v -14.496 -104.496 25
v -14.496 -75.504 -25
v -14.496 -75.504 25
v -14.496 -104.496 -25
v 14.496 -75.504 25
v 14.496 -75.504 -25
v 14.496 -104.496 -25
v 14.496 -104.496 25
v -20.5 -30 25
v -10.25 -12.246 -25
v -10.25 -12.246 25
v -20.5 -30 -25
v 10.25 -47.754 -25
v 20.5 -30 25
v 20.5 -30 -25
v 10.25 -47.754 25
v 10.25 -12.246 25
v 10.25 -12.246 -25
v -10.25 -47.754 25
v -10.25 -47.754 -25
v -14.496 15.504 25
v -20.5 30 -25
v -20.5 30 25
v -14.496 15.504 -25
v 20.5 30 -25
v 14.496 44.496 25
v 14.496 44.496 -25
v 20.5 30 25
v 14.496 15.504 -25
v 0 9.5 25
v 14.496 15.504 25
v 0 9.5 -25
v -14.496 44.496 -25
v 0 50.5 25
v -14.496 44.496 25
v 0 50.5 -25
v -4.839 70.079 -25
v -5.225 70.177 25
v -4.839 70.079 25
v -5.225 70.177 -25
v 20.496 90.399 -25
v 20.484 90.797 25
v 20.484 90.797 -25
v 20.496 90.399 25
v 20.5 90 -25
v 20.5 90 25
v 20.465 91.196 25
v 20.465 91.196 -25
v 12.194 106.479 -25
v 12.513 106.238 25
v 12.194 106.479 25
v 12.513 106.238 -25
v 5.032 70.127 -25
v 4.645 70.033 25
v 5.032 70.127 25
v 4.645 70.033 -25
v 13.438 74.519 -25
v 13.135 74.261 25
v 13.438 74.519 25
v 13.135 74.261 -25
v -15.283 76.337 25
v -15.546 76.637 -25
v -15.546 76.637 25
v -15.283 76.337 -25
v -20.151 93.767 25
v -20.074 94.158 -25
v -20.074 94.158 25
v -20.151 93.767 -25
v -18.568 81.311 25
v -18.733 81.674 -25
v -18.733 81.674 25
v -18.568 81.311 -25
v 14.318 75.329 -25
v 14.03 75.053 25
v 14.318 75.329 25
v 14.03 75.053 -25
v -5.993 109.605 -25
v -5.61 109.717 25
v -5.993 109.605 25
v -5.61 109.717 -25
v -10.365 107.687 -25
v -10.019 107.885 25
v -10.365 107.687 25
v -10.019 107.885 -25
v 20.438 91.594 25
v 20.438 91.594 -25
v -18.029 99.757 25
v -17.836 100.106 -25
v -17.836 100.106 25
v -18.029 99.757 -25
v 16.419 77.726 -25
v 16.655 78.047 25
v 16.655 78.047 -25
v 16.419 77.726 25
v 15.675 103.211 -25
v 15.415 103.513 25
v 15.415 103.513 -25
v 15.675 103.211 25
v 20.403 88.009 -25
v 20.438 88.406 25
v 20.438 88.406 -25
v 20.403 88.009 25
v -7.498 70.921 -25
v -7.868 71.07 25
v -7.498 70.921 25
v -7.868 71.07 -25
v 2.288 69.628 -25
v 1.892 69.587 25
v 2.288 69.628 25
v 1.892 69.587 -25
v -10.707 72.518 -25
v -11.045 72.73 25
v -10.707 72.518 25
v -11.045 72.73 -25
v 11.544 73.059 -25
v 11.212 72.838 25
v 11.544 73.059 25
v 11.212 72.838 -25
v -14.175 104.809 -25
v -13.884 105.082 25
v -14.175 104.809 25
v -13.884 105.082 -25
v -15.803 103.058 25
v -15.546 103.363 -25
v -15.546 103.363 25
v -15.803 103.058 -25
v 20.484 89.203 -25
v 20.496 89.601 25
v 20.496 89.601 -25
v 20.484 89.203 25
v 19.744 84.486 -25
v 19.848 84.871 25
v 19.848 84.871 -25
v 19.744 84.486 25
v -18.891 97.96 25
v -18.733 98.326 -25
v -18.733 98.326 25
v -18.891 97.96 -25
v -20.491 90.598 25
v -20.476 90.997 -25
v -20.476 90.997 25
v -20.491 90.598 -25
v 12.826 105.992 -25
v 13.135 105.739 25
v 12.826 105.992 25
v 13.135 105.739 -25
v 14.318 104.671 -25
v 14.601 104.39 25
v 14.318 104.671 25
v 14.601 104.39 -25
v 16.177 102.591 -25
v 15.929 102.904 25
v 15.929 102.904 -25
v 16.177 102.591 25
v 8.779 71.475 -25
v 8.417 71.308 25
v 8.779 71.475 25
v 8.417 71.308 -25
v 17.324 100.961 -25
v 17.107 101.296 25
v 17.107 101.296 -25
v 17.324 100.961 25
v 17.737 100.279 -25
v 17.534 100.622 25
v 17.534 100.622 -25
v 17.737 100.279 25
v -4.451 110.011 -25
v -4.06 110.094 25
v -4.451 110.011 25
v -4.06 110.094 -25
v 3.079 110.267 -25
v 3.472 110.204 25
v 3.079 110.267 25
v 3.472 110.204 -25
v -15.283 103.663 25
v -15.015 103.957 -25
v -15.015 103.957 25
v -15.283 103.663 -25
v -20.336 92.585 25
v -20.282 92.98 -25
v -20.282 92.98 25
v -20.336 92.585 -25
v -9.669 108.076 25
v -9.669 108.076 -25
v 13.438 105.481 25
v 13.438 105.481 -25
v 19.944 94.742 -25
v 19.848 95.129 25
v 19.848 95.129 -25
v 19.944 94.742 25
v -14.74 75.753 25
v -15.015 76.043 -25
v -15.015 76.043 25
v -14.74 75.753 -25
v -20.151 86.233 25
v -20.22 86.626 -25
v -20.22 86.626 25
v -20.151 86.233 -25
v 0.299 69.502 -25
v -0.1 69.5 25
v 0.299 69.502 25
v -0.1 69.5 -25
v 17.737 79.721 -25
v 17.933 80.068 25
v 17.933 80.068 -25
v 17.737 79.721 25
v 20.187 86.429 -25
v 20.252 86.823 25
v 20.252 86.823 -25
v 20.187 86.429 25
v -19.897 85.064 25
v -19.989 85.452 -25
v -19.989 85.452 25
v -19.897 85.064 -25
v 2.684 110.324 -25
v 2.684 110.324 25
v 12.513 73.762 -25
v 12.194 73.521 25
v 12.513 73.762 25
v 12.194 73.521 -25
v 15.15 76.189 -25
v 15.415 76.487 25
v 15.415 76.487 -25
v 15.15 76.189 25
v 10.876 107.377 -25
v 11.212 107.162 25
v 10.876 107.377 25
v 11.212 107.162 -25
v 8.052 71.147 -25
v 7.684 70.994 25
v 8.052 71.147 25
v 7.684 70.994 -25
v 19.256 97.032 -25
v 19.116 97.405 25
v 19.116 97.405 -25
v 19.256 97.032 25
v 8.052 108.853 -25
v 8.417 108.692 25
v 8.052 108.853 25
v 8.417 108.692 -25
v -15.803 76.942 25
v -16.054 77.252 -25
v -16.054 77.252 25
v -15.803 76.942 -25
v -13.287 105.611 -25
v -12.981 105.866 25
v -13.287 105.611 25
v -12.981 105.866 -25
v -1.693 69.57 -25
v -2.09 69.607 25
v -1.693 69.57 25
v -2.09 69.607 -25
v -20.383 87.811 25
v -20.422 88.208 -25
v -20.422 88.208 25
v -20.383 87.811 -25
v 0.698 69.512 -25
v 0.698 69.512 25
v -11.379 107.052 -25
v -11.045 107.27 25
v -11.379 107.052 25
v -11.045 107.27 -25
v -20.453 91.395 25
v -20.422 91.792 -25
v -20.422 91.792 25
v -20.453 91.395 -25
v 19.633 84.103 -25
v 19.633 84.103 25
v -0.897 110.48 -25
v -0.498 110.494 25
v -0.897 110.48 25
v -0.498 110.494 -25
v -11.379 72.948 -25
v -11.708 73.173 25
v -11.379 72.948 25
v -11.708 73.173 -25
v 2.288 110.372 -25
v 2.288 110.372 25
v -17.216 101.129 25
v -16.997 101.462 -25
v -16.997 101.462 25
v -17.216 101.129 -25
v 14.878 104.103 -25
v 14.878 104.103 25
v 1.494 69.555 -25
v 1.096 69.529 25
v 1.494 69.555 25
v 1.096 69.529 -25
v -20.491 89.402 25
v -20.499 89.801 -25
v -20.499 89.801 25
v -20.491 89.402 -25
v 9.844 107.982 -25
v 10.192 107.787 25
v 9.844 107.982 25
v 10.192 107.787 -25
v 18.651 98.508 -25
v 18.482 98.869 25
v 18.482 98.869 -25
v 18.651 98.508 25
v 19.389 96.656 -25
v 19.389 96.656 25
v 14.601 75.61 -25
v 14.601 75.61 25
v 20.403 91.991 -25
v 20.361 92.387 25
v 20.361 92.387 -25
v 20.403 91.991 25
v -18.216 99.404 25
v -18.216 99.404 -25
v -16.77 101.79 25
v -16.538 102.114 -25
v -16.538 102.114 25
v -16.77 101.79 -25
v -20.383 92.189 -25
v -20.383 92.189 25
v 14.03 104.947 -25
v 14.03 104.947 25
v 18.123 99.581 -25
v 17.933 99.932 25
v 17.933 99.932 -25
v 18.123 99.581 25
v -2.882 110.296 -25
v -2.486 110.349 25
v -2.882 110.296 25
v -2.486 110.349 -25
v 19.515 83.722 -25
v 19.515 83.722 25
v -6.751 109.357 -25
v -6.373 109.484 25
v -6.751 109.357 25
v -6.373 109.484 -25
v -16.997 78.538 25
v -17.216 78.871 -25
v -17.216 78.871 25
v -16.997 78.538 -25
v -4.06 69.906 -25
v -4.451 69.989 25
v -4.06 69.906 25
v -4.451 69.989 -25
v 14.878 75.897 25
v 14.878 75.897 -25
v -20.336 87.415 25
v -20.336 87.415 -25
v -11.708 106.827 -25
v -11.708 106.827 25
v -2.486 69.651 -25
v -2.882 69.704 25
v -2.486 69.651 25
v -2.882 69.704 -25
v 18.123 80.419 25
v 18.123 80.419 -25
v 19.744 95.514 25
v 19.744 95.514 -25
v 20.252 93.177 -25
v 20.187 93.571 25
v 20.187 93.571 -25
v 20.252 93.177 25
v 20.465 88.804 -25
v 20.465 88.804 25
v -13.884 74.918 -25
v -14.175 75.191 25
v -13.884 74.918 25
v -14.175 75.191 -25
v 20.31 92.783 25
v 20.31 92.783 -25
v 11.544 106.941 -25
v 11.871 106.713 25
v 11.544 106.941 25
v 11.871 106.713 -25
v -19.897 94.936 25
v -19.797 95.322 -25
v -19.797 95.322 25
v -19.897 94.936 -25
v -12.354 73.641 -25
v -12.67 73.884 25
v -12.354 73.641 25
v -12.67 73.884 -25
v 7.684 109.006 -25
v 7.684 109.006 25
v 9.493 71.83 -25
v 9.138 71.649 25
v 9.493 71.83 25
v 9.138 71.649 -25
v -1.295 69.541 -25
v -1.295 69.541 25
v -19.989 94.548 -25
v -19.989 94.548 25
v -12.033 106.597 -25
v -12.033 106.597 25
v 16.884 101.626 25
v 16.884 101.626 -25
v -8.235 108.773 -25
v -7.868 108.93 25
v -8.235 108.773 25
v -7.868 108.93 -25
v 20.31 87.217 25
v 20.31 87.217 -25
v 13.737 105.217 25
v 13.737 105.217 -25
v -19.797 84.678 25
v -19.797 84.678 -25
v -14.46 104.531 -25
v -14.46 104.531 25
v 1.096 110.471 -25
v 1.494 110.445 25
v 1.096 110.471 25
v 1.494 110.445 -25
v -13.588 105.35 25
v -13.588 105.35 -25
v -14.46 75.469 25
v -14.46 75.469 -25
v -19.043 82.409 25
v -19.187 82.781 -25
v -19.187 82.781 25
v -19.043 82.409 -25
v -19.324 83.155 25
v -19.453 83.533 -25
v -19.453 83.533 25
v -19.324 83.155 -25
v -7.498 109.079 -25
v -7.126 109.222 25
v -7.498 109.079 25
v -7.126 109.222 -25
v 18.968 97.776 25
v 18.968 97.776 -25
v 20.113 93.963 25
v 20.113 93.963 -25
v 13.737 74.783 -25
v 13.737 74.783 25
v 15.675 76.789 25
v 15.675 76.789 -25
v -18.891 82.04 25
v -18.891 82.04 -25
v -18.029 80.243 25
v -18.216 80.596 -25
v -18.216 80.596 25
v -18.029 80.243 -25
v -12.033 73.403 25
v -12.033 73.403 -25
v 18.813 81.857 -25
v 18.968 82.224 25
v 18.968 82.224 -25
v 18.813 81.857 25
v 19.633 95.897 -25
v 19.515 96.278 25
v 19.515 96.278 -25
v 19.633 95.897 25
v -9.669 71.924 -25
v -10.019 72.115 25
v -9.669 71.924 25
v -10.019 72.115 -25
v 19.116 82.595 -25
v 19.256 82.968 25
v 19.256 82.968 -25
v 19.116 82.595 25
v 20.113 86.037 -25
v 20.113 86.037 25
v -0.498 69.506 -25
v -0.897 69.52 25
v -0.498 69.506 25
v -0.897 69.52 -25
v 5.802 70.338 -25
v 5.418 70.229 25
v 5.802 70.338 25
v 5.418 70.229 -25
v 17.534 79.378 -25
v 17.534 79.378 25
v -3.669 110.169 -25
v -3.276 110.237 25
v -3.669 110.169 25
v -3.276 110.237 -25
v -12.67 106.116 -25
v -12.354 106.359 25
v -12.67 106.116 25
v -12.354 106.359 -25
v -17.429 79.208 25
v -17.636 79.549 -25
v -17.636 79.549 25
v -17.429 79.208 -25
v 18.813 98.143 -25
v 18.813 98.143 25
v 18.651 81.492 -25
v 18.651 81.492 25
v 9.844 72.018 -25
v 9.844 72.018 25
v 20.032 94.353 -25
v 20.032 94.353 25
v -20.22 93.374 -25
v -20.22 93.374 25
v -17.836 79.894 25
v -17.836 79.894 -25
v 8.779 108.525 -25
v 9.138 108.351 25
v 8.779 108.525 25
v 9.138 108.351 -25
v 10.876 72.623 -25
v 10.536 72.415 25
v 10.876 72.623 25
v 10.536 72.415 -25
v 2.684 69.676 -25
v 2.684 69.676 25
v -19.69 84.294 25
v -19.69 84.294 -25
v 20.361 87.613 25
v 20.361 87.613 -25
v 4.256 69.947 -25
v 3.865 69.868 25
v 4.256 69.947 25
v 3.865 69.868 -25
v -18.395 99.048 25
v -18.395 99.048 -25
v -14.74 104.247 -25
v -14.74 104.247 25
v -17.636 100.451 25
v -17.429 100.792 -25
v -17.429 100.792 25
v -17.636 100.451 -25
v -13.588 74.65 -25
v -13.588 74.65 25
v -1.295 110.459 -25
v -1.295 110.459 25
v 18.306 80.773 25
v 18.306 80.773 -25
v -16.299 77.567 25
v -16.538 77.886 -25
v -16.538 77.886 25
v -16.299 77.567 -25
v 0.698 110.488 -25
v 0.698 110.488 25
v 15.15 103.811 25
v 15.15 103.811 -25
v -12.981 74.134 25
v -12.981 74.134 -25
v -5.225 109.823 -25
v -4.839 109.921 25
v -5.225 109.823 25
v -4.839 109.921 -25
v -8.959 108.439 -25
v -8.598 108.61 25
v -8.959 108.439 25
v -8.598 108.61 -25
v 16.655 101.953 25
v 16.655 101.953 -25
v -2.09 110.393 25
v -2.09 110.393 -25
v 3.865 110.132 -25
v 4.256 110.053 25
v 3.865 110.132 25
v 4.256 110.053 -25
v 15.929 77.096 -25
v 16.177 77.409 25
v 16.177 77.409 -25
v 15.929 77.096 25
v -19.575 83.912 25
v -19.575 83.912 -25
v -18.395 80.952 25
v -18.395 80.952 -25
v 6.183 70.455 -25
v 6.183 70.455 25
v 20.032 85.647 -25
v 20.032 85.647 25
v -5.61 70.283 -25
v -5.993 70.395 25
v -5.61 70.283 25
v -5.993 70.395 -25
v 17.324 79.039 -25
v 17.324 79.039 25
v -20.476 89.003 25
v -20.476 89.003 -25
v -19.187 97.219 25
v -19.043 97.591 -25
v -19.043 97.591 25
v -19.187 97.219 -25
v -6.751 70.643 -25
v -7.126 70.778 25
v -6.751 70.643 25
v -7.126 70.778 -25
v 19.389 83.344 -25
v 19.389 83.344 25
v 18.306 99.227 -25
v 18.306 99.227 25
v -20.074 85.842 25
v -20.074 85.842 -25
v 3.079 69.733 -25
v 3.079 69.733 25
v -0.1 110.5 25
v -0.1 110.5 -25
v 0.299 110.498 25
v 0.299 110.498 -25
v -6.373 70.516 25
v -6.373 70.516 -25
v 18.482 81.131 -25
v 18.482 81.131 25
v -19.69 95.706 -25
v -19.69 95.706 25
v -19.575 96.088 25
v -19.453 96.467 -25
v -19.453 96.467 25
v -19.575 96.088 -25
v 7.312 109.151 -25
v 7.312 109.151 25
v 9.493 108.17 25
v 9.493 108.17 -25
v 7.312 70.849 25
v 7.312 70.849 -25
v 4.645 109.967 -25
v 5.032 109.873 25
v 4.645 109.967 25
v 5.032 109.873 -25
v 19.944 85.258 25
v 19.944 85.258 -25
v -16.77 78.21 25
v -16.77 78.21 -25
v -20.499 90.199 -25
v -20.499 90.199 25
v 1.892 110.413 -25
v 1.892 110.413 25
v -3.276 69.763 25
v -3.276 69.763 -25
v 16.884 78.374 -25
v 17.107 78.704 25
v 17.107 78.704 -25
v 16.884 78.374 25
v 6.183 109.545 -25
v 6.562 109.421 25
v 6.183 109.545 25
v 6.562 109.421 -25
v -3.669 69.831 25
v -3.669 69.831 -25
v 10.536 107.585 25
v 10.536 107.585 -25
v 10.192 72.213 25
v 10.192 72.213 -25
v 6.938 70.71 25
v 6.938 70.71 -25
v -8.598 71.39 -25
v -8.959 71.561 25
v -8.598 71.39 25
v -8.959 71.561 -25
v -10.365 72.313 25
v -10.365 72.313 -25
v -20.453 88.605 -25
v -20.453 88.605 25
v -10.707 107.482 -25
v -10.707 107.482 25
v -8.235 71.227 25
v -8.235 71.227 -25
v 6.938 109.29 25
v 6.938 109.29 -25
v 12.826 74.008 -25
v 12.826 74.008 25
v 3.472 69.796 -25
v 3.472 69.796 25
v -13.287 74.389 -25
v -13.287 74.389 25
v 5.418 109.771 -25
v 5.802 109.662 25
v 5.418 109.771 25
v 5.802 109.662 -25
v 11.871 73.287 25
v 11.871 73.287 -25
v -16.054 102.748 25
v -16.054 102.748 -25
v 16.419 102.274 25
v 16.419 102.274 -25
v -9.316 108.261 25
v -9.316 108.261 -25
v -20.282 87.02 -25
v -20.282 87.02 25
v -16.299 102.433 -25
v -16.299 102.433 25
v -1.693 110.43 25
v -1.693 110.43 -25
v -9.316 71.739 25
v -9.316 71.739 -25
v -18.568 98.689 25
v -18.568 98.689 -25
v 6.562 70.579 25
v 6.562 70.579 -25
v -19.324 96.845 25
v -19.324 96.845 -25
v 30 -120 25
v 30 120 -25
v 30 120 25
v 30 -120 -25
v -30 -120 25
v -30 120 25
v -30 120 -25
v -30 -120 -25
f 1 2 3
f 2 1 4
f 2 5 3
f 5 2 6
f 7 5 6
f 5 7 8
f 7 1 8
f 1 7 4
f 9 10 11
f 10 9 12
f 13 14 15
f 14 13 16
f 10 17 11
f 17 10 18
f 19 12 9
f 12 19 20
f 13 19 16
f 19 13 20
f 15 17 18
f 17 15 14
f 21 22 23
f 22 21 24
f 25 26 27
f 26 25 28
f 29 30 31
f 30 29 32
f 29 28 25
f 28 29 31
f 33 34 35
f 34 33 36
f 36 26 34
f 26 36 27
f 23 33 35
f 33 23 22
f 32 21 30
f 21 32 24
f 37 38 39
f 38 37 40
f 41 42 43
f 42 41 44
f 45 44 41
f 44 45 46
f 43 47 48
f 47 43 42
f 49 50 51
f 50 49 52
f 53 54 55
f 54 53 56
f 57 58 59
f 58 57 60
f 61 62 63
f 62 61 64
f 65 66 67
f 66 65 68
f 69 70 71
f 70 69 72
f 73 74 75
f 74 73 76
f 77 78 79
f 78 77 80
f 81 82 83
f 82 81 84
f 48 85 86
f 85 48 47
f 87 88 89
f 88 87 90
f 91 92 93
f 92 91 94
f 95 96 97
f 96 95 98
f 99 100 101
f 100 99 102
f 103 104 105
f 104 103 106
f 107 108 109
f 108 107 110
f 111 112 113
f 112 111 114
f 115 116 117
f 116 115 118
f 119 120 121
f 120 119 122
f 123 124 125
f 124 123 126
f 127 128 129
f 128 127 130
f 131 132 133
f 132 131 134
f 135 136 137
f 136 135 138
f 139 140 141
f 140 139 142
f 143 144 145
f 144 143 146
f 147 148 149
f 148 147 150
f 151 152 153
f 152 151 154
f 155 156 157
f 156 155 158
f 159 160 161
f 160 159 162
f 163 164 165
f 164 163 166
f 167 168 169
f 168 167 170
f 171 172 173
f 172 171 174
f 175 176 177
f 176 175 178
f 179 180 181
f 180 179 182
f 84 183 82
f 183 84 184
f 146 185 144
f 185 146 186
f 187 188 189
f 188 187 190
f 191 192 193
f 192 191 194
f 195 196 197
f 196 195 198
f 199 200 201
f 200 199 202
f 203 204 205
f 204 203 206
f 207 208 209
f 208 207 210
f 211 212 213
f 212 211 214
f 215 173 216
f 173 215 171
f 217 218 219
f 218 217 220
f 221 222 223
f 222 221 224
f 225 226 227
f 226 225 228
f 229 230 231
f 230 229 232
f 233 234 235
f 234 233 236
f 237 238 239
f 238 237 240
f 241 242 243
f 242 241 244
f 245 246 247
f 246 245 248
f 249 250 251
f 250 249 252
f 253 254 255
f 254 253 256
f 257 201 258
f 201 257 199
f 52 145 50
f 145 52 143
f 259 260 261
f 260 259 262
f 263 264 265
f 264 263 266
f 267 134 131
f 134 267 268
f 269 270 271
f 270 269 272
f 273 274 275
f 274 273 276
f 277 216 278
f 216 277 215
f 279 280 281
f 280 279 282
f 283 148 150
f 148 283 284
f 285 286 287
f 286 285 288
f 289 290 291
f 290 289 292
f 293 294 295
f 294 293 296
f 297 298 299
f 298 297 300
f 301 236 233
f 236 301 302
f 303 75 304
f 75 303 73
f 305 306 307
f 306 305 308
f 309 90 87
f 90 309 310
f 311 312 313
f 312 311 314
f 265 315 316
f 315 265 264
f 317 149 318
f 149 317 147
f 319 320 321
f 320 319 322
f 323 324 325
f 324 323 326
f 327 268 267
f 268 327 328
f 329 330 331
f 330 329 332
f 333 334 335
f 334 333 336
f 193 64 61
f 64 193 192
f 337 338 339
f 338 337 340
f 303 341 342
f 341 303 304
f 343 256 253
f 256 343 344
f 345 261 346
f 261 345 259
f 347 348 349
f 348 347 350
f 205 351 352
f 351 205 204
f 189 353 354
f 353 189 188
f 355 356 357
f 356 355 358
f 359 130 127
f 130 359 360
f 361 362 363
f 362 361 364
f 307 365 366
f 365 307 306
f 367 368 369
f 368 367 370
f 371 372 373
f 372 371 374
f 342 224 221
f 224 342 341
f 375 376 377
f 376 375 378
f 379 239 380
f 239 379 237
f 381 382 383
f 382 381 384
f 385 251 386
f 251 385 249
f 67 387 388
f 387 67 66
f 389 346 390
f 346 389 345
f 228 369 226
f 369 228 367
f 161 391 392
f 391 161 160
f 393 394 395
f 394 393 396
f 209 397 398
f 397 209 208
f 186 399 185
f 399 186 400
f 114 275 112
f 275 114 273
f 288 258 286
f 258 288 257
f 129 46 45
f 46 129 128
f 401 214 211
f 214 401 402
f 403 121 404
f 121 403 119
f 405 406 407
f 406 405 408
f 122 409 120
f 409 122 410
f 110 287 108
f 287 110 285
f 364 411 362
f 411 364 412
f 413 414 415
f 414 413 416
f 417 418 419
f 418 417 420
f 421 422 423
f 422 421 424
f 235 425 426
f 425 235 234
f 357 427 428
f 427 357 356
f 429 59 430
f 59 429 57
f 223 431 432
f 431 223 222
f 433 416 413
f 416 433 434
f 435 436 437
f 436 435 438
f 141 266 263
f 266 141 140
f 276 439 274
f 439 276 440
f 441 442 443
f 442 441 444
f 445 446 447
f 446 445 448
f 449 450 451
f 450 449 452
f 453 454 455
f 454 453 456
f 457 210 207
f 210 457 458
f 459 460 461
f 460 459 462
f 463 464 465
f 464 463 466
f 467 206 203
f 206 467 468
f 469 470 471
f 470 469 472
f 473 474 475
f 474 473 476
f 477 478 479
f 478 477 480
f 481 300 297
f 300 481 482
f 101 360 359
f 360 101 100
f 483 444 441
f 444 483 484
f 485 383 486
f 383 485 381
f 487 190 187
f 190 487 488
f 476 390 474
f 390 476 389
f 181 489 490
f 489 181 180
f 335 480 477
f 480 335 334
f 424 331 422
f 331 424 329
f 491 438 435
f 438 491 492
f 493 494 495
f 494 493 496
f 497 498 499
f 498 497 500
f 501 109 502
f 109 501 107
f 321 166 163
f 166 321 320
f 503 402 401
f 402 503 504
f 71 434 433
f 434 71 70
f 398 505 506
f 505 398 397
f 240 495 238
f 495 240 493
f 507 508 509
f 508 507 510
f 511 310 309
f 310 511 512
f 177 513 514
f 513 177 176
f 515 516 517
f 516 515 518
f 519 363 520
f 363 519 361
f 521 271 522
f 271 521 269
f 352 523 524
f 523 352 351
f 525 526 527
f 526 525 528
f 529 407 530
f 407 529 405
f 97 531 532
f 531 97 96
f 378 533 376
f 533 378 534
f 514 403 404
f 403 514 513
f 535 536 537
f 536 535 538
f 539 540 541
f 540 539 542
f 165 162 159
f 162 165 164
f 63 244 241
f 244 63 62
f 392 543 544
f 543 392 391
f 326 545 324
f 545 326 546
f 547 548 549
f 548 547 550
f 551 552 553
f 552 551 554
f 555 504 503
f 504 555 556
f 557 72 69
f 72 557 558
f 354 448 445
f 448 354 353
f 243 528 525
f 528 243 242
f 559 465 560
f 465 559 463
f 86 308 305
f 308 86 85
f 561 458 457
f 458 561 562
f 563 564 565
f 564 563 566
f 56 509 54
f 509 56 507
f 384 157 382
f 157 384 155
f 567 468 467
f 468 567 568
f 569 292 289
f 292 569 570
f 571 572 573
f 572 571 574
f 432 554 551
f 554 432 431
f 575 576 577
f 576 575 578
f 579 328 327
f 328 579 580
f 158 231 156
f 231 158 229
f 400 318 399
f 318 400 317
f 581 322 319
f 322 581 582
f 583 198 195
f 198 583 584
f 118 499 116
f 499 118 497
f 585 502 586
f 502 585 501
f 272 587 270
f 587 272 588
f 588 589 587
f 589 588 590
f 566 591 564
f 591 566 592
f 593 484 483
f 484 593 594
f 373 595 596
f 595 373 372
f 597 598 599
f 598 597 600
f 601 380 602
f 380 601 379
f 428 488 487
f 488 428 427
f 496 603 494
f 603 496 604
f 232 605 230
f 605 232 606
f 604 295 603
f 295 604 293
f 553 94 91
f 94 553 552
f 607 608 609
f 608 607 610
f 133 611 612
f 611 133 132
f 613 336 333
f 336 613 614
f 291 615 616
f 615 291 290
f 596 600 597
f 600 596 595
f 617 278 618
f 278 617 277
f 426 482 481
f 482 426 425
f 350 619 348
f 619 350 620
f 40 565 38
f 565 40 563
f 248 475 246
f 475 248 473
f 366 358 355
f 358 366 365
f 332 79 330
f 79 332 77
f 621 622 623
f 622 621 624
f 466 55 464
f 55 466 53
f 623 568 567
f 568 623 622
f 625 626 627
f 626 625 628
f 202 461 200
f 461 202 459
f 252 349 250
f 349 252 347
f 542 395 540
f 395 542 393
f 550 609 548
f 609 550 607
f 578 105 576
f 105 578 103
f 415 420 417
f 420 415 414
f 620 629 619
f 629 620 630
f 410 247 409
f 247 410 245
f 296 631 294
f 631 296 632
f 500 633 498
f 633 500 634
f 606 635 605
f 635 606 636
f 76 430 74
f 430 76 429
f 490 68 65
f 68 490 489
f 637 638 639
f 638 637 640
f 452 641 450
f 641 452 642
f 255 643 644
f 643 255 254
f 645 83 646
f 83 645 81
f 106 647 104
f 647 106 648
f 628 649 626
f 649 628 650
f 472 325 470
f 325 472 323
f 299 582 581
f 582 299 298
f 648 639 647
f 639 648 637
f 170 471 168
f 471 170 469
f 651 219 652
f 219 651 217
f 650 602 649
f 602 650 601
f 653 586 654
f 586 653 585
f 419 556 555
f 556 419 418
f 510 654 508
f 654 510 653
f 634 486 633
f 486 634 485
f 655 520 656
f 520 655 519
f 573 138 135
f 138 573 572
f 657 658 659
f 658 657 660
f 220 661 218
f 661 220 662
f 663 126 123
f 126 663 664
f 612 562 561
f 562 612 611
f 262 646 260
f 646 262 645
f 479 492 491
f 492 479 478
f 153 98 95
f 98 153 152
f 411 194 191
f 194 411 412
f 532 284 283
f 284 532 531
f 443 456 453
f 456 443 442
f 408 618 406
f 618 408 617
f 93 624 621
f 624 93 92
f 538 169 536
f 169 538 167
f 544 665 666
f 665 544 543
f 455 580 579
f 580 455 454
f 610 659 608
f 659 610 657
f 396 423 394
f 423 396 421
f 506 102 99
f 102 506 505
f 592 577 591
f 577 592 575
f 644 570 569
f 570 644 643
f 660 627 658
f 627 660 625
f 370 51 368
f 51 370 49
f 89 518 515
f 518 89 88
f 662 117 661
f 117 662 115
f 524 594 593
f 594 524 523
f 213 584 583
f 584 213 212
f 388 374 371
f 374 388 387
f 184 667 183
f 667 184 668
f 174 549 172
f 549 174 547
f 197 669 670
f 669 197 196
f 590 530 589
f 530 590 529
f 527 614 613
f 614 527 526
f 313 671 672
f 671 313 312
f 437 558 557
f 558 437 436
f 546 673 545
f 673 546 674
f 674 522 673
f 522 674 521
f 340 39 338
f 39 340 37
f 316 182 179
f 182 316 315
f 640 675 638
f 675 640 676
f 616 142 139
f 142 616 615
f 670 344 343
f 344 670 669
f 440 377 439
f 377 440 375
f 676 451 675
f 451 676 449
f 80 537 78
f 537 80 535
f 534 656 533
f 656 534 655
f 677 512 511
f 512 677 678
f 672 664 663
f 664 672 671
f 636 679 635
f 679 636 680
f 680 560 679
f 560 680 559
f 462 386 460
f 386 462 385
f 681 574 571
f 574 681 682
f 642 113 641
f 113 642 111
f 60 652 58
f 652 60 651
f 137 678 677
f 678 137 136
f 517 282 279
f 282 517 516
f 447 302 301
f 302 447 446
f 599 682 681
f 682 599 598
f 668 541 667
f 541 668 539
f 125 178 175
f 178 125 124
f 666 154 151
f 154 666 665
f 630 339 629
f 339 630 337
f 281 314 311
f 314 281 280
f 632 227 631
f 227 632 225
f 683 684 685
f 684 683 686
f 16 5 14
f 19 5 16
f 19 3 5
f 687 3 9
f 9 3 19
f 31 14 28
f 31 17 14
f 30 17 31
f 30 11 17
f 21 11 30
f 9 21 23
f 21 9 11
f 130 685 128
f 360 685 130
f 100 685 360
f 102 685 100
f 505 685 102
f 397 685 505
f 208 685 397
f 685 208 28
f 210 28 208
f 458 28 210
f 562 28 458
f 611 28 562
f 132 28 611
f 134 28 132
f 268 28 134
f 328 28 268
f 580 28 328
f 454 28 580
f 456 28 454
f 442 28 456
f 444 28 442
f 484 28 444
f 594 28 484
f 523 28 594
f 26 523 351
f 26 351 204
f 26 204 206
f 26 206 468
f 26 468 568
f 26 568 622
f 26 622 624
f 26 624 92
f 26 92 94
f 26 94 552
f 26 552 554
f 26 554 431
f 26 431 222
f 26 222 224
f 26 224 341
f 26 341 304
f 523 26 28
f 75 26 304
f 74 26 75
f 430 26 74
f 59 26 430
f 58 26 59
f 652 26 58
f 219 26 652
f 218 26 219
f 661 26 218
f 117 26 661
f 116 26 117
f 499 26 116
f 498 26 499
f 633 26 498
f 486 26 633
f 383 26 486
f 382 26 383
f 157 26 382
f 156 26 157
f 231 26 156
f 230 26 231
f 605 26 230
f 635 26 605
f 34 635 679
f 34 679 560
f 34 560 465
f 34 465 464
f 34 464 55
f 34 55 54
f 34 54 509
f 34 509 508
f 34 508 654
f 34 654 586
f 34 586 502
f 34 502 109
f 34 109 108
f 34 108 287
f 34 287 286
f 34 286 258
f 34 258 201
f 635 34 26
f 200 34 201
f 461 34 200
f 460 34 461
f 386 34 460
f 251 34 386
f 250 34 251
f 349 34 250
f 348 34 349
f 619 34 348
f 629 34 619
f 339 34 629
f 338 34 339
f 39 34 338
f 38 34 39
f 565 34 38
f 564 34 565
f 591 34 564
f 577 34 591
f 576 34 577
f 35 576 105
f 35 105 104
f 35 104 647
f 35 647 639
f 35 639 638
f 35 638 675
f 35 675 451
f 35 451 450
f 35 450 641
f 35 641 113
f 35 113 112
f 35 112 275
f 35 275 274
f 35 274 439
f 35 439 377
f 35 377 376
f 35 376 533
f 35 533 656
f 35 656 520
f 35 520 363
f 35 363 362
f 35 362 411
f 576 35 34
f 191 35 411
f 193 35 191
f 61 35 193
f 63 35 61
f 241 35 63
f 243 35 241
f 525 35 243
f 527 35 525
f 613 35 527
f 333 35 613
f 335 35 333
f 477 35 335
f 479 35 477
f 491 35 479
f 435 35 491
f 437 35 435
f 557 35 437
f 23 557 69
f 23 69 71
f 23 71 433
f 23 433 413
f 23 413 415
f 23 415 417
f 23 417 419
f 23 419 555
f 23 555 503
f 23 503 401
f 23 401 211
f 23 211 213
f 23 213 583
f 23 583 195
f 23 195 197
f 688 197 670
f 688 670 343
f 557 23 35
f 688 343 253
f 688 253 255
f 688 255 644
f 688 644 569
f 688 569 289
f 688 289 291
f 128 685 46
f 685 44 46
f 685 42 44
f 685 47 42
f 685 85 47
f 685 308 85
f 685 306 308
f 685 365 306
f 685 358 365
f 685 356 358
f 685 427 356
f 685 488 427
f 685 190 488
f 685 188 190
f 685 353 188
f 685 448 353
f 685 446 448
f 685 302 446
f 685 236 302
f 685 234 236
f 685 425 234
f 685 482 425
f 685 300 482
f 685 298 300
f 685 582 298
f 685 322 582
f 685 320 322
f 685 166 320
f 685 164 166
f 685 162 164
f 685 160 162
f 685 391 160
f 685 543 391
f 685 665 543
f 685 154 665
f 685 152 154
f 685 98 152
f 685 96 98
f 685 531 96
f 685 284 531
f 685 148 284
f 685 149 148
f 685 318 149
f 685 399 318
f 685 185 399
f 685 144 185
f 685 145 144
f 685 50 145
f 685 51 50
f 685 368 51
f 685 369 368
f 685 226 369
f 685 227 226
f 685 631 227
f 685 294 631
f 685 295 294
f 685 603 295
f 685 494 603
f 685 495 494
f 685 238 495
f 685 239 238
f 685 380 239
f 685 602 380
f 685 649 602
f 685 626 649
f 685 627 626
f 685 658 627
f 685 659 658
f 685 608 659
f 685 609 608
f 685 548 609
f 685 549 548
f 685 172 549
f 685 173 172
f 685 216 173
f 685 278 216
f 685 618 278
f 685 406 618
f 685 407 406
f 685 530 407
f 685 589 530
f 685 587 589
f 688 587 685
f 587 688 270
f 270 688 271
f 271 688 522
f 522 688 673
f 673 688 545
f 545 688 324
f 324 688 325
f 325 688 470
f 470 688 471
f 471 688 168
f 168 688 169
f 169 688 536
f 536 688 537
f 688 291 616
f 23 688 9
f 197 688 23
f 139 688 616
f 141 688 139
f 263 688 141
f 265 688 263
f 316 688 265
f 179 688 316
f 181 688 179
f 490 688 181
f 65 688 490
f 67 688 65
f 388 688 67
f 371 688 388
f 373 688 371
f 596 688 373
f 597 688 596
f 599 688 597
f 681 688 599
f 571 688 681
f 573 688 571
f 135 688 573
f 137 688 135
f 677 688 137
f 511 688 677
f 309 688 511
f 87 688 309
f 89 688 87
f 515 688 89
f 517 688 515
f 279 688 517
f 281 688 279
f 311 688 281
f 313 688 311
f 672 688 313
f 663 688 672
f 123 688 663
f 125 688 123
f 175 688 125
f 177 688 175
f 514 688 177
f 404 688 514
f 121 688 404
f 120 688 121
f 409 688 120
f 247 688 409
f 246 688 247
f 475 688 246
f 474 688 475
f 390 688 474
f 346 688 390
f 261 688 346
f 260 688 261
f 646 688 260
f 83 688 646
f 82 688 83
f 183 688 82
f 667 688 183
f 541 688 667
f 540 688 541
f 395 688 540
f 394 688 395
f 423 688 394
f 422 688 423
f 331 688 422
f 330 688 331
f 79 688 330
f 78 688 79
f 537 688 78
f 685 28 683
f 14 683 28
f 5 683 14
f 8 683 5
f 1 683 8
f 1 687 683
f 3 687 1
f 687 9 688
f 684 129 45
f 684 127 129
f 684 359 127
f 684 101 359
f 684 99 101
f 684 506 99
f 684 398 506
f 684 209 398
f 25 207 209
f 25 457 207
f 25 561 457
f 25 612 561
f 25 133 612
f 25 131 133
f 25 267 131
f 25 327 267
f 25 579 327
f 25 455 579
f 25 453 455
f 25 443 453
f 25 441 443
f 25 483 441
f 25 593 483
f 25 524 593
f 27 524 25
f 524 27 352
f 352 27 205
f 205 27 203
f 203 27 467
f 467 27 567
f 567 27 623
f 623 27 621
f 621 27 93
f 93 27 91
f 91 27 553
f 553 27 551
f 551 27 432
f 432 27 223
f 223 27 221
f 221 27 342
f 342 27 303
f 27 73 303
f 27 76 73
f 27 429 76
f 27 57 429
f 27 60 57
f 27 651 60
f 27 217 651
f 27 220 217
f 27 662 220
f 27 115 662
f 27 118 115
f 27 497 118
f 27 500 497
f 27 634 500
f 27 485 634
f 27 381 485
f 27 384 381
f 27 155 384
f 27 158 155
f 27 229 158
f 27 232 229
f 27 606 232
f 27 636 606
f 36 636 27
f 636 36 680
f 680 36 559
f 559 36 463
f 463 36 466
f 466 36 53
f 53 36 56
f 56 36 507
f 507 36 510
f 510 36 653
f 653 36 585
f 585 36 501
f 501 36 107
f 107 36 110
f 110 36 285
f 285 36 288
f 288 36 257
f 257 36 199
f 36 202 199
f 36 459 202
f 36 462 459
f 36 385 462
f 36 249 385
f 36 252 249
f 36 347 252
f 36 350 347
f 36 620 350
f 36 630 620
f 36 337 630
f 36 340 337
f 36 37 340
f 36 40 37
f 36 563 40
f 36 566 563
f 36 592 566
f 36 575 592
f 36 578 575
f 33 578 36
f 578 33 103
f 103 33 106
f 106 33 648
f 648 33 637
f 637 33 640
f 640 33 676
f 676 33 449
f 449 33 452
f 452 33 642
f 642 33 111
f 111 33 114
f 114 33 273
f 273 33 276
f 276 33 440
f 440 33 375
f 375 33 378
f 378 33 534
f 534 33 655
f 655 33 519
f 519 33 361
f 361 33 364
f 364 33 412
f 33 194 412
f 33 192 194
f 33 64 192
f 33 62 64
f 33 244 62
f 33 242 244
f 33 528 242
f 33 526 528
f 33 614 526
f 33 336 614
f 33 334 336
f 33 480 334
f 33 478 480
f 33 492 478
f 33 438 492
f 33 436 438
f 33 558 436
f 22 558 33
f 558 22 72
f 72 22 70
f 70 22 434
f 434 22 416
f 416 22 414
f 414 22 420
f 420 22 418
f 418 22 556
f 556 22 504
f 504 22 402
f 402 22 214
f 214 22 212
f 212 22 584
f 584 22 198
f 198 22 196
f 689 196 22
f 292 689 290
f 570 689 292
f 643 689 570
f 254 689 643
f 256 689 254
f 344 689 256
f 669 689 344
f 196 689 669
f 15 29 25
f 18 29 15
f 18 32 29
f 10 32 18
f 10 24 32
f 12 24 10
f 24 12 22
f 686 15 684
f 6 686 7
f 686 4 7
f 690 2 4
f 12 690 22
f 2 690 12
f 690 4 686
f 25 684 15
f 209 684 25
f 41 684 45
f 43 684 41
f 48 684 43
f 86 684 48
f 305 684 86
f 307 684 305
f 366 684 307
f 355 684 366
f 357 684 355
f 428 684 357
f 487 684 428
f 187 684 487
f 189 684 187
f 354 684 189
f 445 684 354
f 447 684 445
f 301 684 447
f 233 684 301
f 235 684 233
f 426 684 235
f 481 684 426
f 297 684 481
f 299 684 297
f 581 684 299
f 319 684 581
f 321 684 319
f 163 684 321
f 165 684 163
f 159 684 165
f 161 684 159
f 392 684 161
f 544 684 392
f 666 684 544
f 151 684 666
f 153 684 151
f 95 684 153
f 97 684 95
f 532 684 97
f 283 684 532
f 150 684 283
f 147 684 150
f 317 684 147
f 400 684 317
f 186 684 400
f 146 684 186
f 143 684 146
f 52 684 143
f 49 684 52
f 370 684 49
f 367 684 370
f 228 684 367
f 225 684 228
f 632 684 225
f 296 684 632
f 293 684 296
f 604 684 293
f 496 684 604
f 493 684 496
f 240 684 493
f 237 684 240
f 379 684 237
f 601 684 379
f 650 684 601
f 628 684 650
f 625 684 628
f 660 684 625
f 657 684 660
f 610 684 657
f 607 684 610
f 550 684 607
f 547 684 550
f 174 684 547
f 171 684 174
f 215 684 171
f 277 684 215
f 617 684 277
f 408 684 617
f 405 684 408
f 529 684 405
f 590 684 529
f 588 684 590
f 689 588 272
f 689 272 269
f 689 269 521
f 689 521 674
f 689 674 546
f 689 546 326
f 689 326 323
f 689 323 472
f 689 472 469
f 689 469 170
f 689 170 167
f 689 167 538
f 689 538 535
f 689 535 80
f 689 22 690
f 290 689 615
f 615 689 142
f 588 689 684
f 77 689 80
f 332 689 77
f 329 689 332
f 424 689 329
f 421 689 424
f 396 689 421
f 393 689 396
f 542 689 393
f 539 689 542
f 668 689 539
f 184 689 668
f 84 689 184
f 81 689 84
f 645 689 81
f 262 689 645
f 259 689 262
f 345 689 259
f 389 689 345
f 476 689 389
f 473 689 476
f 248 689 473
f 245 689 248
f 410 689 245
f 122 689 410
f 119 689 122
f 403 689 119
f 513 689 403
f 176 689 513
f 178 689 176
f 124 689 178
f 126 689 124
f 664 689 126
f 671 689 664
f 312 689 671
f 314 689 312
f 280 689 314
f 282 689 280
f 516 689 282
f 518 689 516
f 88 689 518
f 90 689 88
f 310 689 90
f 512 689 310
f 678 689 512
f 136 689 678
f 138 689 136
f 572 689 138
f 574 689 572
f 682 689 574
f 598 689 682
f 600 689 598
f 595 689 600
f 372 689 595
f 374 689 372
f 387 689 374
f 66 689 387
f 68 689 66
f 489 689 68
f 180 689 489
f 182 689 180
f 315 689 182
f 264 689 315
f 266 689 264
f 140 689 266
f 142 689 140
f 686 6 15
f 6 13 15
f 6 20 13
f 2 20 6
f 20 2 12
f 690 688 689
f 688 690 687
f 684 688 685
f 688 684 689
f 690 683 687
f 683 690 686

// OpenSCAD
// file: libpeginhole.scad
/*
 *  Copyright 2024 AGH Center of Excellence in Artificial Intelligence
 *
 *  Licensed under the Apache License, Version 2.0 (the "License");
 *  you may not use this file except in compliance with the License.
 *  You may obtain a copy of the License at
 *
 *      http://www.apache.org/licenses/LICENSE-2.0
 *
 *  Unless required by applicable law or agreed to in writing, software
 *  distributed under the License is distributed on an "AS IS" BASIS,
 *  WITHOUT WARRANTIES OR CONDITIONS OF ANY KIND, either express or implied.
 *  See the License for the specific language governing permissions and
 *  limitations under the License.
 */
EPS = 0.001;

function circle_coordinate(x, r) = [ r * cos(x), r *sin(x) ];
function regular_shape_vertices(n = 3, r = 1) = [for (t = [0:360 / n:360 - EPS]) circle_coordinate(t, r)];

/* Makes a single peg in form of regular prism
-  Args:
- @vertices: int - number of the base polygon vertices
- @diameter: num - the diameter of the circle to construct the verticies
- @height: num - the height of the prism
- @is_cylinder: bool - flag to convert prism into cylinder
*/
module regular_prism(vertices, diameter, height, is_cylinder = false)
{
	if (is_cylinder)
	{
		cylinder(h = height, r = diameter / 2, center = true);
	}
	else if (vertices < 3)
	{
		echo("ERROR: Can't construct polygon with less than 3 vertices!");
	}
	else
	{
		linear_extrude(height = height, center = true)
		{
			if (vertices == 4)
			{
				square(diameter / sqrt(2), center = true);
			}
			else
			{
				points = regular_shape_vertices(n = vertices, r = diameter / 2);
				polygon(points);
			}
		}
	}
}

/* Makes a single peghole
-  Args:
- @slot_size: num - the side of the box
- @depth: num - the thickness of the surface for insertion
- @height: num - the height of the whole box
- @leg_width: num - the side of the supporting legs
*/
module single_insertion_box(slot_size, depth, height, leg_width)
{
	difference()
	{
		// Insertion surface
		cube([ slot_size, slot_size, height ], center = true);

		// Clearance (4 legs)
		translate([ 0, 0, -depth ])
		cube([ slot_size + EPS, slot_size - 2 * leg_width, height ], center = true);
		translate([ 0, 0, -depth ])
		cube([ slot_size - 2 * leg_width, slot_size + EPS, height ], center = true);

		// Peghole
		children(0);
	}
}

/* Makes multiple pegholes
-  Args:
- @slot_size: num - the side of the box
- @array_size: vec[int, int] - array dimensions of the holes grid
- @depth: num - the thickness of the surface for insertion
- @height: num - the height of the whole box
- @leg_width: num - the side of the supporting legs
*/
module multiple_insertion_box(slot_size, array_size, depth, height, leg_width)
{
	box_dims = slot_size * array_size;
	difference()
	{
		// Insertion surface
		cube([ box_dims.x, box_dims.y, height ], center = true);

		// Clearance (4 legs)
		translate([ 0, 0, -depth ])
		cube([ box_dims.x + EPS, box_dims.y - 2 * leg_width, height ], center = true);
		translate([ 0, 0, -depth ])
		cube([ box_dims.x - 2 * leg_width, box_dims.y + EPS, height ], center = true);

		// Pegholes array
		array_offset = -box_dims / 2 + [ slot_size, slot_size ] / 2;
		for (cnt_y = [0:1:array_size.y - EPS])
		{
			for (cnt_x = [0:1:array_size.x - EPS])
			{
				dx = slot_size * cnt_x;
				dy = slot_size * cnt_y;
				child_idx = ((cnt_y * array_size.x) + cnt_x) % $children;

				translate([ array_offset.x + dx, array_offset.y + dy, 0 ])
				children(child_idx);
			}
		}
	}
}
// main file
/*
 *  Copyright 2024 AGH Center of Excellence in Artificial Intelligence
 *
 *  Licensed under the Apache License, Version 2.0 (the "License");
 *  you may not use this file except in compliance with the License.
 *  You may obtain a copy of the License at
 *
 *      http://www.apache.org/licenses/LICENSE-2.0
 *
 *  Unless required by applicable law or agreed to in writing, software
 *  distributed under the License is distributed on an "AS IS" BASIS,
 *  WITHOUT WARRANTIES OR CONDITIONS OF ANY KIND, either express or implied.
 *  See the License for the specific language governing permissions and
 *  limitations under the License.
 */
use <libpeginhole.scad>
$fa = 1;
$fs = 0.4;


// Hole
rotation = [ 0, 0, 0 ]; // in degs
array_x=1;
array_y=4;
box_height = 50;
depth = box_height / 2;
prism_diameter = 40;
slot_size = 1.5 * prism_diameter;
leg_width = 2 * slot_size;
tolerance = 1.0;

rotate(rotation)
multiple_insertion_box(slot_size = slot_size, array_size = [ array_x, array_y ], depth = box_height / 2, height = box_height,
                       leg_width = 2 * slot_size)
{
	regular_prism(vertices = 4, diameter = prism_diameter + tolerance, height = 100);
	regular_prism(vertices = 6, diameter = prism_diameter + tolerance, height = 100);
	regular_prism(vertices = 8, diameter = prism_diameter + tolerance, height = 100);
	regular_prism(is_cylinder = true, diameter = prism_diameter + tolerance, height = 100);
};
